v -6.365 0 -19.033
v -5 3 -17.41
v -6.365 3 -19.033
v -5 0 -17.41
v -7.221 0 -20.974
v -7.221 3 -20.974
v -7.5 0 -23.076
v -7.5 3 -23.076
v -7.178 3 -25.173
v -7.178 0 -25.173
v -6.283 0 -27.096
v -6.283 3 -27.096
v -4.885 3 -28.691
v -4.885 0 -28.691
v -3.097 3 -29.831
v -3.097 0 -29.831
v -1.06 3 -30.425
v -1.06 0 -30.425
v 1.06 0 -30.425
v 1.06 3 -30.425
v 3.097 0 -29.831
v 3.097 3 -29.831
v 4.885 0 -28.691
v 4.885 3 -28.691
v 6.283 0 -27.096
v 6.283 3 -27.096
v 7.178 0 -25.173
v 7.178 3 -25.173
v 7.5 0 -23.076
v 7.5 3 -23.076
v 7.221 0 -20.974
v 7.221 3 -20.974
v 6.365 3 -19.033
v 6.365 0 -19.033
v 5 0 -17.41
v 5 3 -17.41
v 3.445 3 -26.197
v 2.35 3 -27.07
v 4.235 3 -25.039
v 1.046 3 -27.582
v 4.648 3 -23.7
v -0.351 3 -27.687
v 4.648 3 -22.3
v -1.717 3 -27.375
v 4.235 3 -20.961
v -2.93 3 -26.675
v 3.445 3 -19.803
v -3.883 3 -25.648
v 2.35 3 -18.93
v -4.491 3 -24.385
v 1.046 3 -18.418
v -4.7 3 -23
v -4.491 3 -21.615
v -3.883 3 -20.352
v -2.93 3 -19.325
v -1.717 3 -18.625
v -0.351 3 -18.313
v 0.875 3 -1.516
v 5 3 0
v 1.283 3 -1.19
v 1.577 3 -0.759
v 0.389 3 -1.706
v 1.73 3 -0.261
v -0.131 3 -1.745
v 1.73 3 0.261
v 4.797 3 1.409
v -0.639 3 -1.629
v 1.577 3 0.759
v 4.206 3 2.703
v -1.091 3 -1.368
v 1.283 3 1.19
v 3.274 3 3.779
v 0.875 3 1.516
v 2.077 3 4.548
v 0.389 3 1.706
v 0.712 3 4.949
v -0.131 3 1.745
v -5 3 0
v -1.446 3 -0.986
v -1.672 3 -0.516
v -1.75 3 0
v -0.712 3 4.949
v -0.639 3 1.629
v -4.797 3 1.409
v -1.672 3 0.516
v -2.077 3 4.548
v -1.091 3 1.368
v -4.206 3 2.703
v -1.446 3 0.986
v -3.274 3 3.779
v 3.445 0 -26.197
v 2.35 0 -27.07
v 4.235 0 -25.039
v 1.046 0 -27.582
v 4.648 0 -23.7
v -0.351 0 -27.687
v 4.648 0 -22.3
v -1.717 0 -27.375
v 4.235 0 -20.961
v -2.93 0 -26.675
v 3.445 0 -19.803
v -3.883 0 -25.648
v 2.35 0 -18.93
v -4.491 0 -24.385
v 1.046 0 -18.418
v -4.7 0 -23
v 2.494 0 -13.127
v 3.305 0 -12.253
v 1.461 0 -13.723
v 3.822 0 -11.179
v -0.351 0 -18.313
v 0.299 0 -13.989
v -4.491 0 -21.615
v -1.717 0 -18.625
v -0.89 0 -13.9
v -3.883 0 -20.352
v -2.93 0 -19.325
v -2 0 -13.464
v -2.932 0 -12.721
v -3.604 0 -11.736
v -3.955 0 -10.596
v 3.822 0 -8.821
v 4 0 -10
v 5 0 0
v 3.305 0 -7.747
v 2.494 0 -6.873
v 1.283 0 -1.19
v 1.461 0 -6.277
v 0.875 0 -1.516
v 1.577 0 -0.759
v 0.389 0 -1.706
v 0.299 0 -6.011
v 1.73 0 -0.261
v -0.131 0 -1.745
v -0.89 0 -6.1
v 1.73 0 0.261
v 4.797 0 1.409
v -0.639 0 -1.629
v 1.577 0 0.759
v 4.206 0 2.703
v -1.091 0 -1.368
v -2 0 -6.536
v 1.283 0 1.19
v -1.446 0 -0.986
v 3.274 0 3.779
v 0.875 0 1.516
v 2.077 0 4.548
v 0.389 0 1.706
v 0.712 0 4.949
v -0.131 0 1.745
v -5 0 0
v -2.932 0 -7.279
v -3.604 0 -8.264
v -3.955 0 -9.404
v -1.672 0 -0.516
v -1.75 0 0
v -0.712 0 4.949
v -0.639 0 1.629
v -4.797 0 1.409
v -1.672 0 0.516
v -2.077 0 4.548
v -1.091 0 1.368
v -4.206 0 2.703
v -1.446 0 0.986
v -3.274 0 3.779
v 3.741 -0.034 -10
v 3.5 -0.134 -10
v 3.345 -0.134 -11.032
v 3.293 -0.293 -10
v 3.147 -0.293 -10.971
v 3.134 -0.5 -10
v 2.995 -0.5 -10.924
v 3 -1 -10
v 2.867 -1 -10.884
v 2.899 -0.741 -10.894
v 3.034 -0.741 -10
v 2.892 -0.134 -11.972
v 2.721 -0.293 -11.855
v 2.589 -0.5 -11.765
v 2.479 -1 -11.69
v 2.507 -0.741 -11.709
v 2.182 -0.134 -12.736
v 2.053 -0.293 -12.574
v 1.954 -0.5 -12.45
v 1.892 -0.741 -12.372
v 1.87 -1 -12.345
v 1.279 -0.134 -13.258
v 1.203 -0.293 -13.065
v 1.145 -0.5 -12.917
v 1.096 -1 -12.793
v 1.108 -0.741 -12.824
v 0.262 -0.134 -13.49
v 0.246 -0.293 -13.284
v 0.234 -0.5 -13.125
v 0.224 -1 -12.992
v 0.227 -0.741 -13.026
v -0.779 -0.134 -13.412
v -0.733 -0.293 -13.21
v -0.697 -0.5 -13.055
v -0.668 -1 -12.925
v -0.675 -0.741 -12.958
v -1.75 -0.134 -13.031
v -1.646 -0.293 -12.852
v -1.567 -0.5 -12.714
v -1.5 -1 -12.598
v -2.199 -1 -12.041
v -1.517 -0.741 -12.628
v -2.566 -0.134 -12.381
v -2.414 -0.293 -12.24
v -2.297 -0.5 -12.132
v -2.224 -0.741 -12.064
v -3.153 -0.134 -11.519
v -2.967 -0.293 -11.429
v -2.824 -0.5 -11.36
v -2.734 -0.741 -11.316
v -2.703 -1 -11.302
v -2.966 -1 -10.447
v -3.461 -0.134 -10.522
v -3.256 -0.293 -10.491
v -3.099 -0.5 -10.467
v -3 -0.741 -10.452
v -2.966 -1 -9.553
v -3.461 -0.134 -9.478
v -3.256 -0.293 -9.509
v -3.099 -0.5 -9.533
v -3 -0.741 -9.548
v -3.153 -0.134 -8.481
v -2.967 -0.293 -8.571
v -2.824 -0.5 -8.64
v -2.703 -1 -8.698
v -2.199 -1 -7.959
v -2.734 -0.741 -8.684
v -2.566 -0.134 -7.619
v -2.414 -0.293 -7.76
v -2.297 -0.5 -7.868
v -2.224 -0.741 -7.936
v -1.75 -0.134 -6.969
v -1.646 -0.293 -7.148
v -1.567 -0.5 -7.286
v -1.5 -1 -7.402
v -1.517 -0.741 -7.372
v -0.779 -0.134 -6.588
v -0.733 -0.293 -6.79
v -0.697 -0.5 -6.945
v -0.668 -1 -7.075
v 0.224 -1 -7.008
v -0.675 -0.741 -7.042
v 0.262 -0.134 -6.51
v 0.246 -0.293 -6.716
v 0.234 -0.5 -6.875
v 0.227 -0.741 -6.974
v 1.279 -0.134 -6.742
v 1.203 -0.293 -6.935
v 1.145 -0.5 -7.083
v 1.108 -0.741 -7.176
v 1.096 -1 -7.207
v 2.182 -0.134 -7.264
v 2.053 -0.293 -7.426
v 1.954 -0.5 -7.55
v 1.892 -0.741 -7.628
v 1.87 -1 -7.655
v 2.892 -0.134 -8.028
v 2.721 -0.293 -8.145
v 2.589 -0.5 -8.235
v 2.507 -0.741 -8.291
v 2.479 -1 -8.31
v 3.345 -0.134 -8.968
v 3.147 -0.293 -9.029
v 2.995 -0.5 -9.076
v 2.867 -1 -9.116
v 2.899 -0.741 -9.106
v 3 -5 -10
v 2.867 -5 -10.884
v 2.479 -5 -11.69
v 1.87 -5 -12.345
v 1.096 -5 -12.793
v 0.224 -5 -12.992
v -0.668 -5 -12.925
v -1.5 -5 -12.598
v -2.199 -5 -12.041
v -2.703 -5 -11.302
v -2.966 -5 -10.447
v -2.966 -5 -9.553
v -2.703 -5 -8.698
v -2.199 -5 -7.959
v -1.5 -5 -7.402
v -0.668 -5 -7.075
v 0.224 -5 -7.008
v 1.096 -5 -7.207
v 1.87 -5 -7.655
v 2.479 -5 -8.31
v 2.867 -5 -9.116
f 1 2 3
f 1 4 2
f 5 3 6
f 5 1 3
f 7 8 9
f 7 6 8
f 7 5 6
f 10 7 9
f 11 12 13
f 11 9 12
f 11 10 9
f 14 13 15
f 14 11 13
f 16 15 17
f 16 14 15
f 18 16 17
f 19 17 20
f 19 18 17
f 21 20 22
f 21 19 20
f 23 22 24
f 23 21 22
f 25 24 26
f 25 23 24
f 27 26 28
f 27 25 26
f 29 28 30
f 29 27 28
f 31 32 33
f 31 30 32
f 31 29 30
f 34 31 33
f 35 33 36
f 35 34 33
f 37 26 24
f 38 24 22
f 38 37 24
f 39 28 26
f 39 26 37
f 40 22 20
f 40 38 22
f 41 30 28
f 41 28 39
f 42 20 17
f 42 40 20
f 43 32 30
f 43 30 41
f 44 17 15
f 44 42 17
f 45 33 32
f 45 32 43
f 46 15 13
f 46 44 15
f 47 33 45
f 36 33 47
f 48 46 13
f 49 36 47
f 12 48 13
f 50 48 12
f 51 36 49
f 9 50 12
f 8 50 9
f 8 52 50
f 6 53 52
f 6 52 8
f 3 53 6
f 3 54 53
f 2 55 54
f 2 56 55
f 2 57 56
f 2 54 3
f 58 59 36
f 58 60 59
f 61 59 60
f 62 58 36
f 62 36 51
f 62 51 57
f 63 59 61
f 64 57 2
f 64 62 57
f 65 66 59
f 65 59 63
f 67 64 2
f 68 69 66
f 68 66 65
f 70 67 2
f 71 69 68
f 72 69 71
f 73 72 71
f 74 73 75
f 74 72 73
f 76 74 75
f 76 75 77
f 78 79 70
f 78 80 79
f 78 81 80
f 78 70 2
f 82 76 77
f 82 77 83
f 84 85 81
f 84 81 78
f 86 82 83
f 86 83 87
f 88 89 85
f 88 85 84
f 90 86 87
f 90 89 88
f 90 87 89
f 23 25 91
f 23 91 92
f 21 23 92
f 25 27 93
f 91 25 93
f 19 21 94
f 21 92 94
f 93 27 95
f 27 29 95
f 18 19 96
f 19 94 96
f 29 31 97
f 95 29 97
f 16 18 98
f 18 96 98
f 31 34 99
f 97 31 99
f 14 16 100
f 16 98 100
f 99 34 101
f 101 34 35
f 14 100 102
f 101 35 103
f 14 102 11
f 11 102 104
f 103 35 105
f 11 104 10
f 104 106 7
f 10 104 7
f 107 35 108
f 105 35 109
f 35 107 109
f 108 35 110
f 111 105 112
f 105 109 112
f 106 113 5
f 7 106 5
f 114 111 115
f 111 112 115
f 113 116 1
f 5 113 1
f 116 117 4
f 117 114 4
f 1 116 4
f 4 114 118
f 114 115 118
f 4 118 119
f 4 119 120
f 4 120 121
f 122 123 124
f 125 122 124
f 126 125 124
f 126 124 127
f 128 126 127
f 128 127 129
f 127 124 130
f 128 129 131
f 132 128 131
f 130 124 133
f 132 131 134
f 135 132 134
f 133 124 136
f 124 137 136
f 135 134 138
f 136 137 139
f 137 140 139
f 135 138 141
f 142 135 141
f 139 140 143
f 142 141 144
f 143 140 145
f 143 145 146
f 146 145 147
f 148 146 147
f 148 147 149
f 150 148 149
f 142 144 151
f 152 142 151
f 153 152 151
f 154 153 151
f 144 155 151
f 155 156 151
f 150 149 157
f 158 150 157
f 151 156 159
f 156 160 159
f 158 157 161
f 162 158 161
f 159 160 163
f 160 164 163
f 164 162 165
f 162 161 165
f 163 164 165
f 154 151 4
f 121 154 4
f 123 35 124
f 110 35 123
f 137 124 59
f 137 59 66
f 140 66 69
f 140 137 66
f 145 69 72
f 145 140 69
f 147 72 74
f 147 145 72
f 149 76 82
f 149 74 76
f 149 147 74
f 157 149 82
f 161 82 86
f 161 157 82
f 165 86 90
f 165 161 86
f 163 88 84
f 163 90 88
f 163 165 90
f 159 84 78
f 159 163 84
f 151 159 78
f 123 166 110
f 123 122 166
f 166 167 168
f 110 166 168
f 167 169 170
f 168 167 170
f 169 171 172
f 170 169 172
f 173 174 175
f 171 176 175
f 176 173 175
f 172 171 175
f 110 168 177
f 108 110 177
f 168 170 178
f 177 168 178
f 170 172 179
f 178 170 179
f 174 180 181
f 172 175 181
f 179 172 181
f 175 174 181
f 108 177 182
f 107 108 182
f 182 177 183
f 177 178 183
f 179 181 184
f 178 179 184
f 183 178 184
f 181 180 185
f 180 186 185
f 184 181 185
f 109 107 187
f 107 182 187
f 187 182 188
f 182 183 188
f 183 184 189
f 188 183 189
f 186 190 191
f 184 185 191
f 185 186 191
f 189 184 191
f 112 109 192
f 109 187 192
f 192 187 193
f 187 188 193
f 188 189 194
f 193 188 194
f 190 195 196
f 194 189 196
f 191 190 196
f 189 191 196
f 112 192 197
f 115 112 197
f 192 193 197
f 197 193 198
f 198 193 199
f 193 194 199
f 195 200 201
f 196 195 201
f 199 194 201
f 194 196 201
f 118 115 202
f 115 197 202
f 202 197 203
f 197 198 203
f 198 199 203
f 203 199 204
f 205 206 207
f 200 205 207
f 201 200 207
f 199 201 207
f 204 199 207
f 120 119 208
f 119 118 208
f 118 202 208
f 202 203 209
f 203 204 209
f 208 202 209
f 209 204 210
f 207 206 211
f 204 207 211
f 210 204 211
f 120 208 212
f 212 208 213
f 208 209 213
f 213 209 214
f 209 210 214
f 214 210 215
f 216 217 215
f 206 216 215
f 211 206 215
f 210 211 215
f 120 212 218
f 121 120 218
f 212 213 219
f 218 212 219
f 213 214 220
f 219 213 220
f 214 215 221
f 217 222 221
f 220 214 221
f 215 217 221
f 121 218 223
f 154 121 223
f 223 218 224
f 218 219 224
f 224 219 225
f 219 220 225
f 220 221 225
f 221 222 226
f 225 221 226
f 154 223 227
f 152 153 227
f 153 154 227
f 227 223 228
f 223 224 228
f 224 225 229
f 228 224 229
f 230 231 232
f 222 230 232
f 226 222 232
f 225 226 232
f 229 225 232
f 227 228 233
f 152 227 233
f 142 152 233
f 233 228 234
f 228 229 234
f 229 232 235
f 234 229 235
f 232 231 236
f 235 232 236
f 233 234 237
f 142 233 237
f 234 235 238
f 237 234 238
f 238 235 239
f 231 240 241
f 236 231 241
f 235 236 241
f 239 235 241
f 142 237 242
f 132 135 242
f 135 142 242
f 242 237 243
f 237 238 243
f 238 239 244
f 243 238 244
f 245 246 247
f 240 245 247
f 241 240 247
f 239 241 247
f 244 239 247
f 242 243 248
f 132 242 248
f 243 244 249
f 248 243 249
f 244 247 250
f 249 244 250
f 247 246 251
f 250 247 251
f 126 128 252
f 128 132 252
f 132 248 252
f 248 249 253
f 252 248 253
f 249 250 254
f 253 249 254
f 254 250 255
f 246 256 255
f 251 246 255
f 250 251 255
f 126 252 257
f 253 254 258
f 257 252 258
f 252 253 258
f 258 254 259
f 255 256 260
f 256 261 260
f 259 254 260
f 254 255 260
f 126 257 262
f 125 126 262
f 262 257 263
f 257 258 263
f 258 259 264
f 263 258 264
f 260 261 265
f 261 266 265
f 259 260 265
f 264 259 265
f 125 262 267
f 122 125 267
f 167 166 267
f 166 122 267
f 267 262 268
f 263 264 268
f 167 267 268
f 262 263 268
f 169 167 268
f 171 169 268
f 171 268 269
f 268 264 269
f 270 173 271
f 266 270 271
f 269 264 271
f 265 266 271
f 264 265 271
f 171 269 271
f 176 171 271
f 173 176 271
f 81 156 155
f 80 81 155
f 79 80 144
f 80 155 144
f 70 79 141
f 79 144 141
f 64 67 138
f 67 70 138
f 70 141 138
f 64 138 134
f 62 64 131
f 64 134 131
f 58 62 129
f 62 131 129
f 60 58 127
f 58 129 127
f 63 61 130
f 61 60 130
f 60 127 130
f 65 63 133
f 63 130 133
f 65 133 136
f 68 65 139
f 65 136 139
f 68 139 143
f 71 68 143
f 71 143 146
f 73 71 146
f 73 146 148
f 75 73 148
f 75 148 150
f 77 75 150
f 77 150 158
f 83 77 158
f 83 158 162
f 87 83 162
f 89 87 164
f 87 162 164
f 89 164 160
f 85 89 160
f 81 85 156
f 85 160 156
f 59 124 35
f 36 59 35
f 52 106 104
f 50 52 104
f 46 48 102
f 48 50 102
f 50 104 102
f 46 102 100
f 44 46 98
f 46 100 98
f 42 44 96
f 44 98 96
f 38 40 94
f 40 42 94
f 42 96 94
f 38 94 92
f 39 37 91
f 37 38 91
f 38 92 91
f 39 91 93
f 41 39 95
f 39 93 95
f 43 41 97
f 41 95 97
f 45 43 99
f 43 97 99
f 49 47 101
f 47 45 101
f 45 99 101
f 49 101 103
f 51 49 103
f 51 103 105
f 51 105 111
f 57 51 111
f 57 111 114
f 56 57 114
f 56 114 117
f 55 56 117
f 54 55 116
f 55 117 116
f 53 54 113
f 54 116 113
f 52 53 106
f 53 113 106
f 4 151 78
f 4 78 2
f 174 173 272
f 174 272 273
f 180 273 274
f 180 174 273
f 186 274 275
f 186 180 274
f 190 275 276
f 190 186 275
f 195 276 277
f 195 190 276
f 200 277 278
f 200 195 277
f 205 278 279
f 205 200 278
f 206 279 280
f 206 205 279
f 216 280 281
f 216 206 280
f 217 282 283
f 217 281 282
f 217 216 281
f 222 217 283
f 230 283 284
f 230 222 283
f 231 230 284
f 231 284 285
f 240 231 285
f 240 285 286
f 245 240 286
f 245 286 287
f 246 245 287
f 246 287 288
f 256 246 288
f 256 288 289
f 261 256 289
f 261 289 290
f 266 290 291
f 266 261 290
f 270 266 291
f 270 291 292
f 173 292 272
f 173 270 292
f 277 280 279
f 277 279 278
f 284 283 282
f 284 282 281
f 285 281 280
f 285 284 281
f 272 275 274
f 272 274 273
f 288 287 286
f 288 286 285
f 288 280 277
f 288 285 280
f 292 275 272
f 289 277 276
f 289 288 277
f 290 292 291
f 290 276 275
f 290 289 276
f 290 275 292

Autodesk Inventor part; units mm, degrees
ref_plane "YZ Plane" through (0, 0, 0) normal (1, 0, 0) x (0, 1, 0)
ref_plane "XY Plane" through (0, 0, 0) normal (0, 0, 1) x (1, 0, 0)
sketch "草圖1" plane through (0, 0, 0) normal (0, 1, 0) x (-1, 0, 0)
  circle A0 centre (0, 0) radius 1.75
  arc A1 (5, 0) -> (-5, 0) centre (0, 0) ccw
  circle A2 centre (0, -23) radius 4.7
  arc A3 (-5, -17.4098) -> (5, -17.4098) centre (0, -23) ccw
  line L0 (-5, 0) -> (-5, -17.4098)
  line L1 (5, 0) -> (5, -17.4098)
  line L2 (0, 0) -> (0, -1.75) construction
  line L3 (0, -15.5) -> (0, -23) construction
  dimension "d0" = 3.5
  dimension "d1" = 10
  dimension "d2" = 23
  dimension "d3" = 9.4
  dimension "d4" = 15
extrude "擠出1" add sketch "草圖1" along normal blind 3
ref_plane "工作平面2" through (0, 2.2, 0) normal (0, 1, 0) x (-1, 0, 0)
sketch "草圖3" plane through (0, 2.2, 0) normal (0, 1, 0) x (-1, 0, 0)
  circle A0 centre (0, -23) radius 4.7 projected
  circle A1 centre (0, 0) radius 1.75 projected
  line L0 (-5, 0) -> (-5, -17.4098) projected
  arc A2 (-5, -17.4098) -> (5, -17.4098) centre (0, -23) ccw projected
  line L1 (5, -17.4098) -> (5, 0) projected
  arc A3 (5, 0) -> (-5, 0) centre (0, 0) ccw projected
sketch "草圖4" plane through (0, 0, 0) normal (0, -1, 0) x (1, 0, 0)
  line L0 (0, 0) -> (0, -10) construction
  circle A0 centre (0, -10) radius 3
  dimension "d13" = 10
  dimension "d14" = 6
extrude "擠出3" add sketch "草圖4" along normal blind 5
fillet "圓角1" radius 1 1 edges at (-3, 0, -10)
properties part number "轉軸" material "ABS Plastic"
